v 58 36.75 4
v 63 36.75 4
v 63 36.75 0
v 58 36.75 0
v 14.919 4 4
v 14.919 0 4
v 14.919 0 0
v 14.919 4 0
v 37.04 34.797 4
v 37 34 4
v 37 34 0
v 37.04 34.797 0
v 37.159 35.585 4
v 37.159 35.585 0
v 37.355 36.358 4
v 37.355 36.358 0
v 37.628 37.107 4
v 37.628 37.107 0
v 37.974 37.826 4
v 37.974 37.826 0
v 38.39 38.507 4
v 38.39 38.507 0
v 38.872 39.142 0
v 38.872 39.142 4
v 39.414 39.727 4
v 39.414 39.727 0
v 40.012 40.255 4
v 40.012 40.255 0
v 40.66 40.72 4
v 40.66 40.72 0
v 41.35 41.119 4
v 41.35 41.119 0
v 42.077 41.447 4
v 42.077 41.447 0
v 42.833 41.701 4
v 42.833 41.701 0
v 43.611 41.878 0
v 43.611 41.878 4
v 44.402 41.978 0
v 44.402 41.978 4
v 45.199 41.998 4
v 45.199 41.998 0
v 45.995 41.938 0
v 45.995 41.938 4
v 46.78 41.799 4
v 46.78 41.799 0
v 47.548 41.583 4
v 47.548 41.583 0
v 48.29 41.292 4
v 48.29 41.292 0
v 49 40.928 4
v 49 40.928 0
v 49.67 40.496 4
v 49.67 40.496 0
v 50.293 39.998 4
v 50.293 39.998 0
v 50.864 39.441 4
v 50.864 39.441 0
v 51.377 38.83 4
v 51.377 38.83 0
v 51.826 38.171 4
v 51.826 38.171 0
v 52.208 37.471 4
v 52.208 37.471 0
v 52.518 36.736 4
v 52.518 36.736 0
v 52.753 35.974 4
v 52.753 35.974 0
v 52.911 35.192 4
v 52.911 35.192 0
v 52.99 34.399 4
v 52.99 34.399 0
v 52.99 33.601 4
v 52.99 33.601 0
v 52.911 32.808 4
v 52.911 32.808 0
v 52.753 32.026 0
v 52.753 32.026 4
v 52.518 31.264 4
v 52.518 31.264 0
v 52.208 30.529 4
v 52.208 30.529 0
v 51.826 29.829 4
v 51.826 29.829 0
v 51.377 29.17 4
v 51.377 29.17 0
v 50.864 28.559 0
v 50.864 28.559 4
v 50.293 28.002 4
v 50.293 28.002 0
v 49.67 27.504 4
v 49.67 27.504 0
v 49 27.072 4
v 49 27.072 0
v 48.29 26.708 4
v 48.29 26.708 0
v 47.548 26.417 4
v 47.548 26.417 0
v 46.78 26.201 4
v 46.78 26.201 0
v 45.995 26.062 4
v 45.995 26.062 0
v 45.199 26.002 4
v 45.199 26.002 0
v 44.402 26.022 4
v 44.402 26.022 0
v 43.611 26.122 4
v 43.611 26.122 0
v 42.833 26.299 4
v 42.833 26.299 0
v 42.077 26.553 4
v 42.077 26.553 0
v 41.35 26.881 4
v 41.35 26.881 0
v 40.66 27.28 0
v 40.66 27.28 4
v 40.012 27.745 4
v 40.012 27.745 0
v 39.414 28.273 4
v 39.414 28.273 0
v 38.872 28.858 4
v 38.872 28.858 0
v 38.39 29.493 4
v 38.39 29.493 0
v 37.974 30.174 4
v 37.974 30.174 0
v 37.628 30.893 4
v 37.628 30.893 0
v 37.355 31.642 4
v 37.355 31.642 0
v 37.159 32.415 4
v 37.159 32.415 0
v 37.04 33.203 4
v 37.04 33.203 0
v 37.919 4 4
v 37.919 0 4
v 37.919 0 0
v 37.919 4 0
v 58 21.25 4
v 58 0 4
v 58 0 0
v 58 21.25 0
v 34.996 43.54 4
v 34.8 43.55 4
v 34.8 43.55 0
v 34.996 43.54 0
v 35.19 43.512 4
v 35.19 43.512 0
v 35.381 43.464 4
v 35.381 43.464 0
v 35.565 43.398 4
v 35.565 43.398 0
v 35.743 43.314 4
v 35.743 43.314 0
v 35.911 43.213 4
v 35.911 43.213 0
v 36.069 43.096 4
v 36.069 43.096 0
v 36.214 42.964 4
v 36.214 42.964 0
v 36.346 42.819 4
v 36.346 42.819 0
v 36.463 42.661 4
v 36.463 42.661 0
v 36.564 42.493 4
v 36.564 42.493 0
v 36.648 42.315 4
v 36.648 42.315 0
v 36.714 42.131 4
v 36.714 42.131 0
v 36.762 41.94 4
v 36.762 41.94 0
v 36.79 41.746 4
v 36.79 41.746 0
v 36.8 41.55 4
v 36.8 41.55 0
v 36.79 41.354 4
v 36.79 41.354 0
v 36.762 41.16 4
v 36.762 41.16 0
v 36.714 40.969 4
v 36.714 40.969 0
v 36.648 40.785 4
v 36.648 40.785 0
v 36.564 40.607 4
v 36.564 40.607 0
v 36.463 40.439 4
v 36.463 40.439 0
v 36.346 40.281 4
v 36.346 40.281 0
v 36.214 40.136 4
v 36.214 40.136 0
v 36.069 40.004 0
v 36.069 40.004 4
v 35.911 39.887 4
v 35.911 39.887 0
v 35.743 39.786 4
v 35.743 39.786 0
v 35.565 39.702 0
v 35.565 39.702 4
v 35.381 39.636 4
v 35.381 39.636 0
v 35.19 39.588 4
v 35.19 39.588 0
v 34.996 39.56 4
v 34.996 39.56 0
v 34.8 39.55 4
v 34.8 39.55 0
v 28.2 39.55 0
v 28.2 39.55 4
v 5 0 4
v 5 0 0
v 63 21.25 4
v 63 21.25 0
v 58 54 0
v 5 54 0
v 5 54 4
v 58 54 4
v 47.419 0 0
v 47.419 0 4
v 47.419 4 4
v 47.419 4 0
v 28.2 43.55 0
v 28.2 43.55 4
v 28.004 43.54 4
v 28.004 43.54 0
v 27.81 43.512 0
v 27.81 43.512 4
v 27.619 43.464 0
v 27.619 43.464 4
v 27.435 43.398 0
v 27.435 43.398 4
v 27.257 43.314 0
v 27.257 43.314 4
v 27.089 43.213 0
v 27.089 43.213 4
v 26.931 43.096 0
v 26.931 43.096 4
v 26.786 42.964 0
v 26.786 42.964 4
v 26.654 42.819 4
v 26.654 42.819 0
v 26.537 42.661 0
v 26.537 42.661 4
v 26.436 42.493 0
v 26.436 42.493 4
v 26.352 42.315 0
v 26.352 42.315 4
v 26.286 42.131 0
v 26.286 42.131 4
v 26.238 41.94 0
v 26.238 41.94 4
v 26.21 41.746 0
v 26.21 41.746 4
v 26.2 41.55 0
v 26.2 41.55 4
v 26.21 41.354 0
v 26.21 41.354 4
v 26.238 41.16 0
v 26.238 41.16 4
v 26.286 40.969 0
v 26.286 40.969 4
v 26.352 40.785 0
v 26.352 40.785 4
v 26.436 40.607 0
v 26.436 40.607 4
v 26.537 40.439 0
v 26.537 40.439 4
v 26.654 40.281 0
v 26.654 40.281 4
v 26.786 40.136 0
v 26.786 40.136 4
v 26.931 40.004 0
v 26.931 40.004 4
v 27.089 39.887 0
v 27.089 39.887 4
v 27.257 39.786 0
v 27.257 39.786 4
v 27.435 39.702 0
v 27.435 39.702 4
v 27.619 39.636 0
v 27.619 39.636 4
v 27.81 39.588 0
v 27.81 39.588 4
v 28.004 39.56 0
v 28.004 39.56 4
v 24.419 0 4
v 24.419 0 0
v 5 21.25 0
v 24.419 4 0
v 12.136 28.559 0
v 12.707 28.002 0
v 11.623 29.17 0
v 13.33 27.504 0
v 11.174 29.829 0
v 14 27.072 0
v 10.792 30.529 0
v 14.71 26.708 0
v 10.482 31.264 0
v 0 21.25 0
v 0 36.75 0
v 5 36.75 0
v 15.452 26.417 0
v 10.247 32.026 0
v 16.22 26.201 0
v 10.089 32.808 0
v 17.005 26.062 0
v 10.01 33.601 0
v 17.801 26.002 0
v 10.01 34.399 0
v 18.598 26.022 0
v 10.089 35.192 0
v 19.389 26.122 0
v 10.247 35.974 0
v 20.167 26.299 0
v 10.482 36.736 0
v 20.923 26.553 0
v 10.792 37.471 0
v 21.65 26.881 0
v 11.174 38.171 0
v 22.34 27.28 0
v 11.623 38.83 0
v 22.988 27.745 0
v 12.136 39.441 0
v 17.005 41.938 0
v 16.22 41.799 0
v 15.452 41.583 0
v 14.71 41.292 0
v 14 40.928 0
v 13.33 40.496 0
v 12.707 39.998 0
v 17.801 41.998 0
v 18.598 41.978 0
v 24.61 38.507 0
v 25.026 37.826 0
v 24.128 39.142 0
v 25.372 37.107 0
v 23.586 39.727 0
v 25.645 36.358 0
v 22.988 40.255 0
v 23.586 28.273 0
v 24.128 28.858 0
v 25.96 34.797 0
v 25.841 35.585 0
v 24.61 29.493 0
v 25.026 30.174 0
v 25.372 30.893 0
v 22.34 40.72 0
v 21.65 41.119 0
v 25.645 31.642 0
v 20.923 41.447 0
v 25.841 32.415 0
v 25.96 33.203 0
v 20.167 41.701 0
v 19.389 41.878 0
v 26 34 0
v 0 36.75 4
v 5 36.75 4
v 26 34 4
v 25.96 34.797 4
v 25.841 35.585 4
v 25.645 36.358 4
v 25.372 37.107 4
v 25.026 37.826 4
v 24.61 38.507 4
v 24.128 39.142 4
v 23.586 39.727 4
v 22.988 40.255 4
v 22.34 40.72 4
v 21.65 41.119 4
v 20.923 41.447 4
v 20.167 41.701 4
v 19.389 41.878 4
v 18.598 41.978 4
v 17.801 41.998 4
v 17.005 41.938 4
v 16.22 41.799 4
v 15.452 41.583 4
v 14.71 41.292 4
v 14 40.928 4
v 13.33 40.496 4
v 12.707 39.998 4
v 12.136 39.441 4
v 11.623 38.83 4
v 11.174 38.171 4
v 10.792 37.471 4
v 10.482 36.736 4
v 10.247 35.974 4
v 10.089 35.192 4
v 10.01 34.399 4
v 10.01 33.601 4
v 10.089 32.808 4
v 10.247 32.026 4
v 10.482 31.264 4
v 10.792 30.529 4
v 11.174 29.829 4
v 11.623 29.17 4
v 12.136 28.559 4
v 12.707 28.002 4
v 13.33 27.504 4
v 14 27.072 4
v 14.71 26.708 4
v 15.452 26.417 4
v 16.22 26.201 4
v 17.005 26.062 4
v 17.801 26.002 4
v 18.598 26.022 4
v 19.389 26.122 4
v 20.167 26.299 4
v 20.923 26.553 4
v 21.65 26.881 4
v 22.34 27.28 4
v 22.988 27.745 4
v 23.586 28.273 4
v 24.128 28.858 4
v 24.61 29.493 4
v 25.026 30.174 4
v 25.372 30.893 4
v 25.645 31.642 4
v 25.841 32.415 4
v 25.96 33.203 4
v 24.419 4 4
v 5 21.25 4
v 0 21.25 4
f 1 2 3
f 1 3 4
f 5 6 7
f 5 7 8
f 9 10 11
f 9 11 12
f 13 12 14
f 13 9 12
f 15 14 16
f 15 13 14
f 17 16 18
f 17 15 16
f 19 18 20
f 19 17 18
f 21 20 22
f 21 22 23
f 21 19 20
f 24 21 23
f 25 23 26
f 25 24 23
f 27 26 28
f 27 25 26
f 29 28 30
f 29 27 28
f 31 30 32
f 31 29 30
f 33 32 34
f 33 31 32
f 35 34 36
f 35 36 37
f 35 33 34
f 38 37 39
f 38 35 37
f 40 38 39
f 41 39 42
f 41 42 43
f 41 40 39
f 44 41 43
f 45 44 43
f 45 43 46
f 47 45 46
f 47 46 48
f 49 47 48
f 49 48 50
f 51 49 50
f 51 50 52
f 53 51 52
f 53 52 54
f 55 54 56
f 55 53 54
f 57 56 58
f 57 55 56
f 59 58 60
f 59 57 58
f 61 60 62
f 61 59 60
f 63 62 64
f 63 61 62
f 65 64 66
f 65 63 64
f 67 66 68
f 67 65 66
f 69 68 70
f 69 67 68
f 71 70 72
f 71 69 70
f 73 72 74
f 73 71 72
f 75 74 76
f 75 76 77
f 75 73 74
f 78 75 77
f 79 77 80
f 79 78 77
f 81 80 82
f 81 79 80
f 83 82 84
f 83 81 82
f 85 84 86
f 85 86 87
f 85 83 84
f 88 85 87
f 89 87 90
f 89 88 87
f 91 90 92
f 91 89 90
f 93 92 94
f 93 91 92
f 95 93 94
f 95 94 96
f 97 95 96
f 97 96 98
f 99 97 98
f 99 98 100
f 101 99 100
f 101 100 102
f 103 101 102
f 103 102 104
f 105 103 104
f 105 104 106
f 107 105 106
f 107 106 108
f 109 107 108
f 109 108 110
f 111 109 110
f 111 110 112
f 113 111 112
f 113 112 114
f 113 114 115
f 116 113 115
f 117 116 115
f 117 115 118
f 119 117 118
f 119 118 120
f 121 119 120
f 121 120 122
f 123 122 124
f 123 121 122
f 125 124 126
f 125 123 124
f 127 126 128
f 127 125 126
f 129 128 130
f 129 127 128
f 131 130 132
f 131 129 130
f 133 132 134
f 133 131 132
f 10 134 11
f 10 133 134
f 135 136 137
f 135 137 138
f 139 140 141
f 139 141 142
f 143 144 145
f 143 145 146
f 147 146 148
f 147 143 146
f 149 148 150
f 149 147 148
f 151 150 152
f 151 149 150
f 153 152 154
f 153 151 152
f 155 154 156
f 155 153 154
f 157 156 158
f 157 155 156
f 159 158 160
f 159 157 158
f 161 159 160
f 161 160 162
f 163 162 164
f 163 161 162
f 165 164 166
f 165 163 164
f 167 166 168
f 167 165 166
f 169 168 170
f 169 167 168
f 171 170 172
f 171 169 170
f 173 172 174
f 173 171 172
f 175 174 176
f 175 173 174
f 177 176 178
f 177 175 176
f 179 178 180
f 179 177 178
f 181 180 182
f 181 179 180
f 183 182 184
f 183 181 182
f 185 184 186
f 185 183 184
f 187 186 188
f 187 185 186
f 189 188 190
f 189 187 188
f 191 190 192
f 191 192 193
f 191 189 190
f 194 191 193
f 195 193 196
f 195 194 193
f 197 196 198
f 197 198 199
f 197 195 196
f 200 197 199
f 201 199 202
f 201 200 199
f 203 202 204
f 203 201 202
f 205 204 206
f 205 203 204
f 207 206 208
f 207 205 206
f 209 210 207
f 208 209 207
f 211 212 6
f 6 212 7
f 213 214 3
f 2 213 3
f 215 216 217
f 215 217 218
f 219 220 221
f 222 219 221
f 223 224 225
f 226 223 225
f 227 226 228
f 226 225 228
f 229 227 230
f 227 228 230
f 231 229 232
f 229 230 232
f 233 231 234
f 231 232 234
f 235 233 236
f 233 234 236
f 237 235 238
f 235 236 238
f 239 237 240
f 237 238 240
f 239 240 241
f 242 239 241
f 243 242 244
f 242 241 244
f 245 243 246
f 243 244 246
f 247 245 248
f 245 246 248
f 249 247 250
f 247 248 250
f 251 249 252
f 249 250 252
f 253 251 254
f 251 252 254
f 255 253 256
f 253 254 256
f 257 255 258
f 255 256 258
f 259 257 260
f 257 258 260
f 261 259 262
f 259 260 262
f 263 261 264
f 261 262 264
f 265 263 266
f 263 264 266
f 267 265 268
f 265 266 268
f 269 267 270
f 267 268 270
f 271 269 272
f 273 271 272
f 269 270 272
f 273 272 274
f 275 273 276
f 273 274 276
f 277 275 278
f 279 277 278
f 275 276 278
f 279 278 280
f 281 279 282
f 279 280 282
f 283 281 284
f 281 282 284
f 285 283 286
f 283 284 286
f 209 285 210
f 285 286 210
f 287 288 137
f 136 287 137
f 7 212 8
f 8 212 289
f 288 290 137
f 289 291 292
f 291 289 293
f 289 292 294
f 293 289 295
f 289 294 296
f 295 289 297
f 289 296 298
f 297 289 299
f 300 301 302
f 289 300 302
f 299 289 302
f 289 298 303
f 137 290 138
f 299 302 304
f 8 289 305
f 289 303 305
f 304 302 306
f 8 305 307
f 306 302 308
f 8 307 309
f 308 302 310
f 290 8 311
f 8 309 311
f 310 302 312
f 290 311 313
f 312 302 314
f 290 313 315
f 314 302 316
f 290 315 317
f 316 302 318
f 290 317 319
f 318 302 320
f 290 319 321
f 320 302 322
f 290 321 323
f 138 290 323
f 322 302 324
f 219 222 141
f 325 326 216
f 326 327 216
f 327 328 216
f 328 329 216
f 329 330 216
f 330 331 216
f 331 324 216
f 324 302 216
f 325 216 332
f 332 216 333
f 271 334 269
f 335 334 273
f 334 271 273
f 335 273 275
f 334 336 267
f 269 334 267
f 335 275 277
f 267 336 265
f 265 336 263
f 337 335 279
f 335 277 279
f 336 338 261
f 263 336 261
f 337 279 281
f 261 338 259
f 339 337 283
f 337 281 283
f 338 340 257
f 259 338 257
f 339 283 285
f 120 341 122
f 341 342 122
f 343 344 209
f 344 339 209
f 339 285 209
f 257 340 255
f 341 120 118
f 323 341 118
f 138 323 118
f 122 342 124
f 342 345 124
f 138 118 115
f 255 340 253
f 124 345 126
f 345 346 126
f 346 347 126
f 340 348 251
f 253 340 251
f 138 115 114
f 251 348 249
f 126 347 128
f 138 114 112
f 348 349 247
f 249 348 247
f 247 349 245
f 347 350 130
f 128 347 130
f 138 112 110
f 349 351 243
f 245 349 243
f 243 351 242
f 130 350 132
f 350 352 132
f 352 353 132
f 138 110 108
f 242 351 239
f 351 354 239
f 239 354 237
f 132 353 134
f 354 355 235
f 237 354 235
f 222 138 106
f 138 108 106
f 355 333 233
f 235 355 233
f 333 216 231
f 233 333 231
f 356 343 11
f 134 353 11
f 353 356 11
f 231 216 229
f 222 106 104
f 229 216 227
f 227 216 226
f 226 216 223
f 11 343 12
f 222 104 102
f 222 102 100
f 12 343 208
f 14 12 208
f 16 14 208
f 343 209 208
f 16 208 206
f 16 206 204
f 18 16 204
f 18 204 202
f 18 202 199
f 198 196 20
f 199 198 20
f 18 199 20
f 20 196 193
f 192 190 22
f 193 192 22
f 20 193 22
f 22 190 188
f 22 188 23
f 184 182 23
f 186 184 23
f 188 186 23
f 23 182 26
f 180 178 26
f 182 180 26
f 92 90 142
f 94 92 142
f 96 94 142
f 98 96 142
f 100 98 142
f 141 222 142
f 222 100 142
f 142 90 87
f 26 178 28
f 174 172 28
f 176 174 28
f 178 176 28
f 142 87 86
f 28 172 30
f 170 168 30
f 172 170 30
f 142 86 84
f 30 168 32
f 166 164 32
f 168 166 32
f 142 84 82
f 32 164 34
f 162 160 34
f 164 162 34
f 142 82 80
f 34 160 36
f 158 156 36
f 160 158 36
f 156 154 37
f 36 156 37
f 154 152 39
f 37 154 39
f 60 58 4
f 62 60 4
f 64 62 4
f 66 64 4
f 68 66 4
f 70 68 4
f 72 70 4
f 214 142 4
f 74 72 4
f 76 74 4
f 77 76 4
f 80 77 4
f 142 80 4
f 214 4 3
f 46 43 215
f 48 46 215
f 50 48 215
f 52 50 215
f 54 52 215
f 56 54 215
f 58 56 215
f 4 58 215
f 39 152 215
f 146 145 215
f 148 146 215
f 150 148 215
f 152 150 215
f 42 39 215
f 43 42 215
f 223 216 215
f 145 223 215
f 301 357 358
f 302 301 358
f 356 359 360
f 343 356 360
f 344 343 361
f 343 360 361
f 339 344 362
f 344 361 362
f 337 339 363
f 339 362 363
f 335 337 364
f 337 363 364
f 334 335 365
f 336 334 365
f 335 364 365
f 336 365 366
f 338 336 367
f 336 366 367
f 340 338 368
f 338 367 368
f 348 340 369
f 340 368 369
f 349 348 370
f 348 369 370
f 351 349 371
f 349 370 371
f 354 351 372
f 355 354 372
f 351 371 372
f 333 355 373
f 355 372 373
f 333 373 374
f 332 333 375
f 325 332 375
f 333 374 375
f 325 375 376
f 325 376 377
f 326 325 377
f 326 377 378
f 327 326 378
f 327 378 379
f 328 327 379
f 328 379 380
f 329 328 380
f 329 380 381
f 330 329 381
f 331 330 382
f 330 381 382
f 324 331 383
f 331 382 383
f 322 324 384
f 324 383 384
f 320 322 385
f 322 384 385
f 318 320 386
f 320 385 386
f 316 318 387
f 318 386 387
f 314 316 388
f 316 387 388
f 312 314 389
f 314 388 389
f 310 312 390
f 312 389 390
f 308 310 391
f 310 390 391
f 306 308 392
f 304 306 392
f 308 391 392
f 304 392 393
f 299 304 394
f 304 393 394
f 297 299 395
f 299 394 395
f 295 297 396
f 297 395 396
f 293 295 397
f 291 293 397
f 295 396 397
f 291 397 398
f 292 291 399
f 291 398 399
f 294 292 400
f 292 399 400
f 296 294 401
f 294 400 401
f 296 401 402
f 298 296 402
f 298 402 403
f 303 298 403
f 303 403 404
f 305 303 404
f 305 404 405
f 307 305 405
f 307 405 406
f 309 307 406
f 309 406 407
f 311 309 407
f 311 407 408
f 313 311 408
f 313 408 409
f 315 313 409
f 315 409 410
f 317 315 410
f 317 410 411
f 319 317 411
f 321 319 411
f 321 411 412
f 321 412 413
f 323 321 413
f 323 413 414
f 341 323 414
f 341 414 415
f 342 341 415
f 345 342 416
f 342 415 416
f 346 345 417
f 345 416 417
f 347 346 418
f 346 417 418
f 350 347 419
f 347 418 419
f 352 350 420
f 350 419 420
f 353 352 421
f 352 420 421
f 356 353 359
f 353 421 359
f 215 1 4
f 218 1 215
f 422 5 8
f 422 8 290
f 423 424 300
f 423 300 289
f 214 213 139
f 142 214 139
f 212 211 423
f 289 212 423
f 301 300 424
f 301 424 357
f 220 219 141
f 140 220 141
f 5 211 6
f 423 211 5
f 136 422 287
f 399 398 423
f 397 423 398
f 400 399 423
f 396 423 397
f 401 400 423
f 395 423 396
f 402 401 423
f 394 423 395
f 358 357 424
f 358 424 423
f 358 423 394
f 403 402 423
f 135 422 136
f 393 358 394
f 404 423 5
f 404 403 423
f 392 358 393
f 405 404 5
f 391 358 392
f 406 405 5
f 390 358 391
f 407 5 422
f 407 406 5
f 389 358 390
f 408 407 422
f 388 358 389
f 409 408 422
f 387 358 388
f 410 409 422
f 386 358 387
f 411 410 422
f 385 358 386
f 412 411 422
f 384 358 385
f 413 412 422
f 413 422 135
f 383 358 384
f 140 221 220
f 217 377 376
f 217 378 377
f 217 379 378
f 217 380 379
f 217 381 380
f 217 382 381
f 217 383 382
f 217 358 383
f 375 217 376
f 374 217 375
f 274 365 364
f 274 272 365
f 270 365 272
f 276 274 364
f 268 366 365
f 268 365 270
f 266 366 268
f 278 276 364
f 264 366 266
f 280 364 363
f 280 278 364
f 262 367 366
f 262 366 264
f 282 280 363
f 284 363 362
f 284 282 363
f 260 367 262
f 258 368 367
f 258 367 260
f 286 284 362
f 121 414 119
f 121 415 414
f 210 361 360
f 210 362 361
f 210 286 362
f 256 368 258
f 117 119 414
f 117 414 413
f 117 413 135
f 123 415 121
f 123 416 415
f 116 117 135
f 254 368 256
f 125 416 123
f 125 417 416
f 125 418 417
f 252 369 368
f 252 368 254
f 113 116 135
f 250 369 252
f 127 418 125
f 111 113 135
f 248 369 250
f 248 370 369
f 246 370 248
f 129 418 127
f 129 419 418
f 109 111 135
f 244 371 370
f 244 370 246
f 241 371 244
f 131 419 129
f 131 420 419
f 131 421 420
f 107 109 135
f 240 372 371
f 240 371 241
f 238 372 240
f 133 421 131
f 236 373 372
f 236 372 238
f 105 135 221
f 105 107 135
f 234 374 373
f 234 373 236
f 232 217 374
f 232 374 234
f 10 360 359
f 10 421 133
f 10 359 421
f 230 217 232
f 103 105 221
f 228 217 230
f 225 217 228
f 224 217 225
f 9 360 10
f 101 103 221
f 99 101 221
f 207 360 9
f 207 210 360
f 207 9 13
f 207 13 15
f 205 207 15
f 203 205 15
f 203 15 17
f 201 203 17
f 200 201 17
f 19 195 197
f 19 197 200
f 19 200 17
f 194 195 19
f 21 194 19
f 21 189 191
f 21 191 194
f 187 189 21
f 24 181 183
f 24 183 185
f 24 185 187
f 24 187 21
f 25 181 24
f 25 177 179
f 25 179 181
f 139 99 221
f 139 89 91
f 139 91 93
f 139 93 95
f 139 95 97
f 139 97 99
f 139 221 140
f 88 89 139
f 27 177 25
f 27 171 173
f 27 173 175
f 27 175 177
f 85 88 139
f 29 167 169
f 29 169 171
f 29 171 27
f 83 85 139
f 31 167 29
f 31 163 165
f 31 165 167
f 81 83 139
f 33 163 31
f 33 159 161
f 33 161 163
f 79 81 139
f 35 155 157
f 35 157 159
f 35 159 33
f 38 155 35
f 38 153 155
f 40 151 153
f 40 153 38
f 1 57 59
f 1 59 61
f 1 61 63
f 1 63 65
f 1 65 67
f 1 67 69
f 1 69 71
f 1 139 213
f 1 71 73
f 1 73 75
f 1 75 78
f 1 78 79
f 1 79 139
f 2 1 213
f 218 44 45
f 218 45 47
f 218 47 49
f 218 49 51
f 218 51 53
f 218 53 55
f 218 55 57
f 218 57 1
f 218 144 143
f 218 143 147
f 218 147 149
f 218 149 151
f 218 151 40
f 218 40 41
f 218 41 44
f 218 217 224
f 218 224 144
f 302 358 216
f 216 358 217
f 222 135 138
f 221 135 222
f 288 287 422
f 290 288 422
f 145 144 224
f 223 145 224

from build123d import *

# Parameters (mm, degrees)
SKIZZE1_W                       = 63
SKIZZE1_H                       = 54
AUFSATZ_LINEAR_AUSTRAGEN1_DEPTH = 4
SCHNITT_LINEAR_AUSTRAGEN3_REACH = 6
SKIZZE4_W                       = 9.5
SKIZZE4_H                       = 4
SKIZZE2_W                       = 5
SKIZZE2_H                       = 17.25
SKIZZE2_H_2                     = 21.25
SCHNITT_LINEAR_AUSTRAGEN1_DEPTH = 4
SKIZZE5_R                       = 8
SCHNITT_LINEAR_AUSTRAGEN4_DEPTH = 4


with BuildPart() as part:
    # Skizze1 → Aufsatz-Linear austragen1 (new body)
    with BuildSketch(Plane.XY):
        with Locations((31.5, 27)):
            Rectangle(SKIZZE1_W, SKIZZE1_H)
    extrude(amount=AUFSATZ_LINEAR_AUSTRAGEN1_DEPTH)

    # Skizze4 → Schnitt-Linear austragen3 (cut, up to next)
    with BuildSketch(Plane.XY.offset(4), mode=Mode.PRIVATE) as schnitt_linear_austragen3_sk1:
        with Locations((19.669225385, 2)):
            Rectangle(SKIZZE4_W, SKIZZE4_H)
    schnitt_linear_austragen3_tool1 = extrude(schnitt_linear_austragen3_sk1.sketch, amount=-SCHNITT_LINEAR_AUSTRAGEN3_REACH, mode=Mode.PRIVATE) & part.part
    add(schnitt_linear_austragen3_tool1.solids().sort_by_distance((19.669225, 2, 4))[0], mode=Mode.SUBTRACT)
    # Skizze4 → Schnitt-Linear austragen3 (cut, up to next)
    with BuildSketch(Plane.XY.offset(4), mode=Mode.PRIVATE) as schnitt_linear_austragen3_sk2:
        with Locations((42.669225385, 2)):
            Rectangle(SKIZZE4_W, SKIZZE4_H)
    schnitt_linear_austragen3_tool2 = extrude(schnitt_linear_austragen3_sk2.sketch, amount=-SCHNITT_LINEAR_AUSTRAGEN3_REACH, mode=Mode.PRIVATE) & part.part
    add(schnitt_linear_austragen3_tool2.solids().sort_by_distance((42.669225, 2, 4))[0], mode=Mode.SUBTRACT)

    # Skizze2 → Schnitt-Linear austragen1 (cut)
    with BuildSketch(Plane.XY.offset(4)):
        with Locations((2.5, 45.375)):
            Rectangle(SKIZZE2_W, SKIZZE2_H)
        with Locations((2.5, 10.625)):
            Rectangle(SKIZZE2_W, SKIZZE2_H_2)
    schnitt_linear_austragen1 = extrude(amount=-SCHNITT_LINEAR_AUSTRAGEN1_DEPTH, mode=Mode.SUBTRACT)

    # Spiegeln1: Schnitt-Linear austragen1 across plane
    add(schnitt_linear_austragen1.mirror(Plane.ZY.offset(-31.5)), mode=Mode.SUBTRACT)

    # Skizze5 → Schnitt-Linear austragen4 (cut)
    with BuildSketch(Plane.XY.offset(4)):
        with Locations((18, 34)):
            Circle(SKIZZE5_R)
        with BuildLine():
            Line((31.5, 43.55), (28.2, 43.55))
            ThreePointArc((28.2, 43.55), (26.2, 41.55), (28.2, 39.55))
            Line((28.2, 39.55), (31.5, 39.55))
            Line((31.5, 39.55), (31.5, 43.55))
        make_face()
    schnitt_linear_austragen4 = extrude(amount=-SCHNITT_LINEAR_AUSTRAGEN4_DEPTH, mode=Mode.SUBTRACT)

    # Spiegeln2: Schnitt-Linear austragen4 across plane
    add(schnitt_linear_austragen4.mirror(Plane.ZY.offset(-31.5)), mode=Mode.SUBTRACT)


solid = part.part
